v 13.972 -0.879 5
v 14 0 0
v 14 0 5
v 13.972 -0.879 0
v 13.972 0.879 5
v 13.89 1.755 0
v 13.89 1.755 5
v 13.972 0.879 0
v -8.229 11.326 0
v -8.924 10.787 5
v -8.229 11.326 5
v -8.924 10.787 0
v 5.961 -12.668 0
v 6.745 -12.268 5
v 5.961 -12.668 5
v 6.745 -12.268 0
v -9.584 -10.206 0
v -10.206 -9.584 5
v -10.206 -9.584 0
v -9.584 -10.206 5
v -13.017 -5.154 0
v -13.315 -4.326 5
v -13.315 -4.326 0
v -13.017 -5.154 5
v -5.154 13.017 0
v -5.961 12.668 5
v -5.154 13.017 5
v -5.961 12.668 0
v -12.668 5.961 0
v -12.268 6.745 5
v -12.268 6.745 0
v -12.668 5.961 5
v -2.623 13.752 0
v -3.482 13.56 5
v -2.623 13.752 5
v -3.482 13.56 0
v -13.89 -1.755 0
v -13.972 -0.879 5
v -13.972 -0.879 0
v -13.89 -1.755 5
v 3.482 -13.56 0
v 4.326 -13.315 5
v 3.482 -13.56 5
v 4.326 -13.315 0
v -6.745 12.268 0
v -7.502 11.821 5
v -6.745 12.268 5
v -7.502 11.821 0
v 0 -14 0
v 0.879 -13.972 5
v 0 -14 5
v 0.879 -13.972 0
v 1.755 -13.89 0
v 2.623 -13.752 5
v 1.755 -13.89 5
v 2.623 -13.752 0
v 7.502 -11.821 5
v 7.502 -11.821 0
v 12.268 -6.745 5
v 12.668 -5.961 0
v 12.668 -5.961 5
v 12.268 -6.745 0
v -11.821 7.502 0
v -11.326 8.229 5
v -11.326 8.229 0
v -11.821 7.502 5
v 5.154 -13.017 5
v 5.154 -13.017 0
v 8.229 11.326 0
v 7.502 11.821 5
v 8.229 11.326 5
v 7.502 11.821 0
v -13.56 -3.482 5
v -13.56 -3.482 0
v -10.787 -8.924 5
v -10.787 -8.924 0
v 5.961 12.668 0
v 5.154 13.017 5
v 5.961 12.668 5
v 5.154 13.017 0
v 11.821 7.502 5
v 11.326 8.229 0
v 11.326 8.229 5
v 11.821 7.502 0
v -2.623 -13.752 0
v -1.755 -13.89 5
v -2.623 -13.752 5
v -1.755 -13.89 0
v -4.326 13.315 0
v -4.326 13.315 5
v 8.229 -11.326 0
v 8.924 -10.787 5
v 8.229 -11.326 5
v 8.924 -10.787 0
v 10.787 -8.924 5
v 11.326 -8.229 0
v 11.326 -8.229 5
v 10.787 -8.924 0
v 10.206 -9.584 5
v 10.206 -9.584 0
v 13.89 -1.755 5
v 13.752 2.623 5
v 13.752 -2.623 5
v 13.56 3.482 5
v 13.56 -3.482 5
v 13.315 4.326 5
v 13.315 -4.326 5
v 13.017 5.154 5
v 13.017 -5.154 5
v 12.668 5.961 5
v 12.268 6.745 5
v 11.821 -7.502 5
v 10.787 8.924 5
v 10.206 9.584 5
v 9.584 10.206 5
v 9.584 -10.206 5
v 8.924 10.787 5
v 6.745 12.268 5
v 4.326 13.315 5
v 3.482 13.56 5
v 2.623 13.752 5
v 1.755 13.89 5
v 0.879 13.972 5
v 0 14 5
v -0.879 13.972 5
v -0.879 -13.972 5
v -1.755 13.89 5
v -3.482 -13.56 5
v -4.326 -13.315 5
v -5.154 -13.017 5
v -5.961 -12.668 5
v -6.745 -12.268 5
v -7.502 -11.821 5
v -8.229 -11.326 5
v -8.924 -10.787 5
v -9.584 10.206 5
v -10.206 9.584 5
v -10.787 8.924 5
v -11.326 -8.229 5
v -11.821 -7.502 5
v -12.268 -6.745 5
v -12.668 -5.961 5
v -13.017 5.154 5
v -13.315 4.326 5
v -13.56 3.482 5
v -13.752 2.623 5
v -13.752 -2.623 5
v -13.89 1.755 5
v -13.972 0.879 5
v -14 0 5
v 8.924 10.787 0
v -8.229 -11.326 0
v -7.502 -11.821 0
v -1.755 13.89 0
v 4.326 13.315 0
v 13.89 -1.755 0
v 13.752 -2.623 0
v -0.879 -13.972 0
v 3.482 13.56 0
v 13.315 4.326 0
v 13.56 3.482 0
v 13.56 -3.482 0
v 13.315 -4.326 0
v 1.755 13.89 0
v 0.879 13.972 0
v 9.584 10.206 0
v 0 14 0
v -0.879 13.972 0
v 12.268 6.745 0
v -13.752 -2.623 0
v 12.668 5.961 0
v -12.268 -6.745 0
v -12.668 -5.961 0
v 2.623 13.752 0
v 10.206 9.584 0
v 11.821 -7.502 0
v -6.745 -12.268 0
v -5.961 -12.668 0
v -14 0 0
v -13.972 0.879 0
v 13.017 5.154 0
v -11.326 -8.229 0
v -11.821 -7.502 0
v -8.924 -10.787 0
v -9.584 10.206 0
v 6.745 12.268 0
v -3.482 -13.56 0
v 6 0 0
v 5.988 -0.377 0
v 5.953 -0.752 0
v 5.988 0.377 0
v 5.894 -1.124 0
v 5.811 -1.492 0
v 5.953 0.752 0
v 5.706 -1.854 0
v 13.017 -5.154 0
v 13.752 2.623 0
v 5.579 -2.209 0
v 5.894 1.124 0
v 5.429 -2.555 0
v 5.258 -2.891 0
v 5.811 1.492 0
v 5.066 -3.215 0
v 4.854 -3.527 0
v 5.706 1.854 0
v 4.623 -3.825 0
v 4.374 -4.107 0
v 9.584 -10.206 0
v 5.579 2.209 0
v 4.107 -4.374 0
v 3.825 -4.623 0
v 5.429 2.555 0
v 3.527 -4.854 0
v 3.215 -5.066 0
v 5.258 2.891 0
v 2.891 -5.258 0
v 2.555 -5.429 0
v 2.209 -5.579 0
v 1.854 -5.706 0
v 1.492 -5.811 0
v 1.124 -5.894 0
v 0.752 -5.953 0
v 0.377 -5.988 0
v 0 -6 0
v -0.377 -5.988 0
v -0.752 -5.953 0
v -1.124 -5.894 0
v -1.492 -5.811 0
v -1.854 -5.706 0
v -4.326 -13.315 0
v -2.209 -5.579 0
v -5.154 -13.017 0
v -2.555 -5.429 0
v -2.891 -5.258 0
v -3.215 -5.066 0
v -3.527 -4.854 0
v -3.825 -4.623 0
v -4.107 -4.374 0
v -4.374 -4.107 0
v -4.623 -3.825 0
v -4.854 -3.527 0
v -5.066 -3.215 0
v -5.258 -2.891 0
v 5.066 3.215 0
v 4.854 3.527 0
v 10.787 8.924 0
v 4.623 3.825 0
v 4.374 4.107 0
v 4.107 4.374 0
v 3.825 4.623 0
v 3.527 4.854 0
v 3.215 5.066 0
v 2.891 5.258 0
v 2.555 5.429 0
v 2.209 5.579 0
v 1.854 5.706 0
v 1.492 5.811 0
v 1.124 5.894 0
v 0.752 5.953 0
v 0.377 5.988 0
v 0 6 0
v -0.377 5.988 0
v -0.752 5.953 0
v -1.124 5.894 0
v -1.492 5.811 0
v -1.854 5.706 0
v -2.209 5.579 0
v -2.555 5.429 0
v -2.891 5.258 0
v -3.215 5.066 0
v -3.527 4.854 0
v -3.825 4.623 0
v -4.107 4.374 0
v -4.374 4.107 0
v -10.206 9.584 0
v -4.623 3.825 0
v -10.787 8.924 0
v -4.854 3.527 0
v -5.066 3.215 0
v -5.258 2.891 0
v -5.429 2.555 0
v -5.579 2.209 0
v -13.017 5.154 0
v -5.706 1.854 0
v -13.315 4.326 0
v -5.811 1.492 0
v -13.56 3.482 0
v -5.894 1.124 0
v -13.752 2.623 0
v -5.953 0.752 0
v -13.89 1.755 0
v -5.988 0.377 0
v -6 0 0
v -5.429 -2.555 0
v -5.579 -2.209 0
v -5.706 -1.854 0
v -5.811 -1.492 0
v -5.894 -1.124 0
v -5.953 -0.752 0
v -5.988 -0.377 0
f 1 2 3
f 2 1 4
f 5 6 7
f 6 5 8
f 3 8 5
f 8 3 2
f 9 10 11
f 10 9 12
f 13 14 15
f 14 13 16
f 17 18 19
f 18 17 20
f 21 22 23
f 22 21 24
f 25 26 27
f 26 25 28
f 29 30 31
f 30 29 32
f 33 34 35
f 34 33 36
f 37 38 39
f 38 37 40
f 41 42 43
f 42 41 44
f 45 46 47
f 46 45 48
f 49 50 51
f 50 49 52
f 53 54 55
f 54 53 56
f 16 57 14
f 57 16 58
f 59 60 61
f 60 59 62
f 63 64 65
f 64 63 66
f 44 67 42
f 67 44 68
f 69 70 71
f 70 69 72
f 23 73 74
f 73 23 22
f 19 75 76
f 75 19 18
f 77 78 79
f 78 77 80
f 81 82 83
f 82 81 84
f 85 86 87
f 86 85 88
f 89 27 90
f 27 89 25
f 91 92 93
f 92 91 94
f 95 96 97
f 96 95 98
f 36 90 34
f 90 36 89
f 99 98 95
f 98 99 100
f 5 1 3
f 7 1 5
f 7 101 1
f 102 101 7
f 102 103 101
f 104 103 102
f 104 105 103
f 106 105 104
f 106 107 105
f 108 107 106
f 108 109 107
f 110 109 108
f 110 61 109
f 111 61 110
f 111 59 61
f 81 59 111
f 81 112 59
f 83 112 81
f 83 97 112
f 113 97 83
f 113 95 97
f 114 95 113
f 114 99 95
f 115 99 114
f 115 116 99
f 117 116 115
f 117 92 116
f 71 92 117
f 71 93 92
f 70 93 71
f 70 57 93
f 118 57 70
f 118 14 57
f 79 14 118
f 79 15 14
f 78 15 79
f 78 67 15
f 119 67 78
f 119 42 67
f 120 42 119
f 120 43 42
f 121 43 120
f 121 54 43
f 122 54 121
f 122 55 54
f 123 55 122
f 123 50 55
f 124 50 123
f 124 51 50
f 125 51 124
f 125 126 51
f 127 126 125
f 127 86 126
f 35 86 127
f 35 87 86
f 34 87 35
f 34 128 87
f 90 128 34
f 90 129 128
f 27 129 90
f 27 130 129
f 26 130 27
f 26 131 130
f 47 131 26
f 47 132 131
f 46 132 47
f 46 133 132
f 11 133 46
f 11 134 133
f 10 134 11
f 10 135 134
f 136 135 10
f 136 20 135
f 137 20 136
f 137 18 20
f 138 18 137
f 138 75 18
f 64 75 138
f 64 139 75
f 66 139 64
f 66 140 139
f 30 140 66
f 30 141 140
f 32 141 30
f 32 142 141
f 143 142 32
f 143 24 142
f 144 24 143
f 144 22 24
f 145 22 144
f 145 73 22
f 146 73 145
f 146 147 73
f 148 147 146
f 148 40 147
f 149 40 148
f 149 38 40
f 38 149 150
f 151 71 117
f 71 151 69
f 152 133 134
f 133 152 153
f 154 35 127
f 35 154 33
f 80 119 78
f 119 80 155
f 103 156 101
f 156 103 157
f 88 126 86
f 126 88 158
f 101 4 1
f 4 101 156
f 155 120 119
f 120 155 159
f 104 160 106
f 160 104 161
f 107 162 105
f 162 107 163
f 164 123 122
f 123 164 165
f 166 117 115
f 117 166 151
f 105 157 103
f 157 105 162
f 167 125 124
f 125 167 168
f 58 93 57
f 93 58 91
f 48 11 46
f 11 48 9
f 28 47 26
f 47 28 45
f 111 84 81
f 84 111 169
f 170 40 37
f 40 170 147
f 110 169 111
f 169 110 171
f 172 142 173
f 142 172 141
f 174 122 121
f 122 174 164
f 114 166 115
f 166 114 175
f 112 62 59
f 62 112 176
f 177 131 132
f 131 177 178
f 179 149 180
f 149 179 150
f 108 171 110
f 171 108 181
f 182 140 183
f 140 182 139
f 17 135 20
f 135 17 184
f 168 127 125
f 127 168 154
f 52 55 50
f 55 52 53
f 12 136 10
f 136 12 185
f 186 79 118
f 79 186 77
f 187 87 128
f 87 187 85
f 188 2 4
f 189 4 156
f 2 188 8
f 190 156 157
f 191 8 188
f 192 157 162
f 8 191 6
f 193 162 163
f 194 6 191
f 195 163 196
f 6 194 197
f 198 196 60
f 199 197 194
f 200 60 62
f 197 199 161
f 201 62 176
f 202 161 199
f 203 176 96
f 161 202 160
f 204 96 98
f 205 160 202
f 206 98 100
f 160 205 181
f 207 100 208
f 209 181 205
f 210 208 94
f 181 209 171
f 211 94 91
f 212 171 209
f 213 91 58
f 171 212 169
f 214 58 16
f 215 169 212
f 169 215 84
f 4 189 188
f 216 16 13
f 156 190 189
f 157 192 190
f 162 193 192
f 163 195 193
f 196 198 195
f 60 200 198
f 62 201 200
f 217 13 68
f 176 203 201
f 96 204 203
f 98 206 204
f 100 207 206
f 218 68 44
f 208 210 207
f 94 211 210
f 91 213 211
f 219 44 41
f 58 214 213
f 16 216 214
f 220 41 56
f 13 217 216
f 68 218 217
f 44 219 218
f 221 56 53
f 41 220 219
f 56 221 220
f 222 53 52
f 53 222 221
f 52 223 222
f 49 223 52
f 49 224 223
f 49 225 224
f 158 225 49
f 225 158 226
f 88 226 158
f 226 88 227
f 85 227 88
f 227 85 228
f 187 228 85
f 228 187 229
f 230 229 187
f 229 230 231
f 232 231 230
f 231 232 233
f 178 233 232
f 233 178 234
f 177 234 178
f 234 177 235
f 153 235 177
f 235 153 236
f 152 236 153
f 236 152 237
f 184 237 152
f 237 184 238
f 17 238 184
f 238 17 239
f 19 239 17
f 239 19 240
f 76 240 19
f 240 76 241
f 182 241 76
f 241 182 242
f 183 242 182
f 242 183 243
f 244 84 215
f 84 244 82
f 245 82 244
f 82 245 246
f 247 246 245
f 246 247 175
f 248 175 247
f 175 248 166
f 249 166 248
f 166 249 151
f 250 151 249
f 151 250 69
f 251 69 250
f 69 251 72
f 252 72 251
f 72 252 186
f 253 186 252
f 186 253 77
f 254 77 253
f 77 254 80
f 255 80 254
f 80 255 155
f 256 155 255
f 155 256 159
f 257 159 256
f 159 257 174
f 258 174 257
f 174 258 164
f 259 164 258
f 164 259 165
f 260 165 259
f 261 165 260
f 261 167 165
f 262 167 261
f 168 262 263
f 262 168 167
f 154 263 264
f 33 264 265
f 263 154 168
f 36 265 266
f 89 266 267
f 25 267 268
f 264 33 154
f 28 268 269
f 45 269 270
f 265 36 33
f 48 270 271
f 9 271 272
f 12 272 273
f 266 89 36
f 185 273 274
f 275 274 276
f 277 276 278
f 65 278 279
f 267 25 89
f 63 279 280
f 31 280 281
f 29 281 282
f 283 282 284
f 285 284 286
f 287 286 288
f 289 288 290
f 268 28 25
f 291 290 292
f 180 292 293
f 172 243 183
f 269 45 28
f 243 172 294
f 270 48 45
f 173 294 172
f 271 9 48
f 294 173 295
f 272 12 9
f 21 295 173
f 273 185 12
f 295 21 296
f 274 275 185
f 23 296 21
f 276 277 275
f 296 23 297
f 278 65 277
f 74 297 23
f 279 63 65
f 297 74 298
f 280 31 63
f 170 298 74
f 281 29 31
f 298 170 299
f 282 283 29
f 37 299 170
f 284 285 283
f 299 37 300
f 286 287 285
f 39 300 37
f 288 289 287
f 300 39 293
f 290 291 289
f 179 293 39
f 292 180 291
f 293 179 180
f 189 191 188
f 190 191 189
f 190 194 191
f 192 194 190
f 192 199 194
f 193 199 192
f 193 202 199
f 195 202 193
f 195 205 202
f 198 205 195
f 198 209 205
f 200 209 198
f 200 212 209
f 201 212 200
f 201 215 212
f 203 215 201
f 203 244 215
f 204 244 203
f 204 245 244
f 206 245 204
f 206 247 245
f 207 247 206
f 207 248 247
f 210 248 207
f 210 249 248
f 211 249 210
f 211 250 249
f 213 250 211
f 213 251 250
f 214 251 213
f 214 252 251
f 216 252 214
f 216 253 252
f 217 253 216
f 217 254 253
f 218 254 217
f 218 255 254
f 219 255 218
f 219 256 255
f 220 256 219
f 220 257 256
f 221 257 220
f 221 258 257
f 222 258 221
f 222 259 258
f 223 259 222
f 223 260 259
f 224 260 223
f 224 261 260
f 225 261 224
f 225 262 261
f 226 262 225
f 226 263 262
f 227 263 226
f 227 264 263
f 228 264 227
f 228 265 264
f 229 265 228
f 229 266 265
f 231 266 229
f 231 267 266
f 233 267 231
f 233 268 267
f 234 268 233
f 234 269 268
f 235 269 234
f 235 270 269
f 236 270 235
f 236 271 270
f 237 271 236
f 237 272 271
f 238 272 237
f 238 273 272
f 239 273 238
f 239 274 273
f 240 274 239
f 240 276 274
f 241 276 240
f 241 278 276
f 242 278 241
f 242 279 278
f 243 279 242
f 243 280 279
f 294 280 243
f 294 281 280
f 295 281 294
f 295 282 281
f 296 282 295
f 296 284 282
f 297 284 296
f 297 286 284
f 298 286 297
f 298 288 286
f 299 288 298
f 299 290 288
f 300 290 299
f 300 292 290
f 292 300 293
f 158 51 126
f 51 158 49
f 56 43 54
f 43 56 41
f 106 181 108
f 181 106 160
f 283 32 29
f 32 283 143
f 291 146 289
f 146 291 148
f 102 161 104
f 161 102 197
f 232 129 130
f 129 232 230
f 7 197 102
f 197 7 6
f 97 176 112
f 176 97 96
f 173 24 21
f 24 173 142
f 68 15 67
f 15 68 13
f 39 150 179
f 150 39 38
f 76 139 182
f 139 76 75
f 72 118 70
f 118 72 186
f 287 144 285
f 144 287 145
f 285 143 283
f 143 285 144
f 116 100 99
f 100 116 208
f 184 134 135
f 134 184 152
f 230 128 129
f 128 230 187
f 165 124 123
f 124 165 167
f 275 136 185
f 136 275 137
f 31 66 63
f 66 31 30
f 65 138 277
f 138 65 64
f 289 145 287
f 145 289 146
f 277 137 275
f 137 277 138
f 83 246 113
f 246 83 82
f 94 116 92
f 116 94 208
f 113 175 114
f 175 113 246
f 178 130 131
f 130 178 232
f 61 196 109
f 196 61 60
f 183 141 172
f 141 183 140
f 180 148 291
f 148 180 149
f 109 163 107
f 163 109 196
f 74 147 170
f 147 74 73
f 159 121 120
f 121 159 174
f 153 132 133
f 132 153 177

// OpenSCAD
// Key cap dimensions
keycap_height = 5; // Height of the key cap
keycap_radius = 14; // Radius of the key cap
stem_height = 15; // Height of the stem
stem_radius = 6; // Radius of the stem

// Create the key cap
difference() {
    // Outer cylinder (key cap)
    cylinder(h = keycap_height, r = keycap_radius, $fn=100);
    
    // Inner cylinder (stem)
    translate([0, 0, -stem_height]) {
        cylinder(h = stem_height, r = stem_radius, $fn=100);
    }
}
